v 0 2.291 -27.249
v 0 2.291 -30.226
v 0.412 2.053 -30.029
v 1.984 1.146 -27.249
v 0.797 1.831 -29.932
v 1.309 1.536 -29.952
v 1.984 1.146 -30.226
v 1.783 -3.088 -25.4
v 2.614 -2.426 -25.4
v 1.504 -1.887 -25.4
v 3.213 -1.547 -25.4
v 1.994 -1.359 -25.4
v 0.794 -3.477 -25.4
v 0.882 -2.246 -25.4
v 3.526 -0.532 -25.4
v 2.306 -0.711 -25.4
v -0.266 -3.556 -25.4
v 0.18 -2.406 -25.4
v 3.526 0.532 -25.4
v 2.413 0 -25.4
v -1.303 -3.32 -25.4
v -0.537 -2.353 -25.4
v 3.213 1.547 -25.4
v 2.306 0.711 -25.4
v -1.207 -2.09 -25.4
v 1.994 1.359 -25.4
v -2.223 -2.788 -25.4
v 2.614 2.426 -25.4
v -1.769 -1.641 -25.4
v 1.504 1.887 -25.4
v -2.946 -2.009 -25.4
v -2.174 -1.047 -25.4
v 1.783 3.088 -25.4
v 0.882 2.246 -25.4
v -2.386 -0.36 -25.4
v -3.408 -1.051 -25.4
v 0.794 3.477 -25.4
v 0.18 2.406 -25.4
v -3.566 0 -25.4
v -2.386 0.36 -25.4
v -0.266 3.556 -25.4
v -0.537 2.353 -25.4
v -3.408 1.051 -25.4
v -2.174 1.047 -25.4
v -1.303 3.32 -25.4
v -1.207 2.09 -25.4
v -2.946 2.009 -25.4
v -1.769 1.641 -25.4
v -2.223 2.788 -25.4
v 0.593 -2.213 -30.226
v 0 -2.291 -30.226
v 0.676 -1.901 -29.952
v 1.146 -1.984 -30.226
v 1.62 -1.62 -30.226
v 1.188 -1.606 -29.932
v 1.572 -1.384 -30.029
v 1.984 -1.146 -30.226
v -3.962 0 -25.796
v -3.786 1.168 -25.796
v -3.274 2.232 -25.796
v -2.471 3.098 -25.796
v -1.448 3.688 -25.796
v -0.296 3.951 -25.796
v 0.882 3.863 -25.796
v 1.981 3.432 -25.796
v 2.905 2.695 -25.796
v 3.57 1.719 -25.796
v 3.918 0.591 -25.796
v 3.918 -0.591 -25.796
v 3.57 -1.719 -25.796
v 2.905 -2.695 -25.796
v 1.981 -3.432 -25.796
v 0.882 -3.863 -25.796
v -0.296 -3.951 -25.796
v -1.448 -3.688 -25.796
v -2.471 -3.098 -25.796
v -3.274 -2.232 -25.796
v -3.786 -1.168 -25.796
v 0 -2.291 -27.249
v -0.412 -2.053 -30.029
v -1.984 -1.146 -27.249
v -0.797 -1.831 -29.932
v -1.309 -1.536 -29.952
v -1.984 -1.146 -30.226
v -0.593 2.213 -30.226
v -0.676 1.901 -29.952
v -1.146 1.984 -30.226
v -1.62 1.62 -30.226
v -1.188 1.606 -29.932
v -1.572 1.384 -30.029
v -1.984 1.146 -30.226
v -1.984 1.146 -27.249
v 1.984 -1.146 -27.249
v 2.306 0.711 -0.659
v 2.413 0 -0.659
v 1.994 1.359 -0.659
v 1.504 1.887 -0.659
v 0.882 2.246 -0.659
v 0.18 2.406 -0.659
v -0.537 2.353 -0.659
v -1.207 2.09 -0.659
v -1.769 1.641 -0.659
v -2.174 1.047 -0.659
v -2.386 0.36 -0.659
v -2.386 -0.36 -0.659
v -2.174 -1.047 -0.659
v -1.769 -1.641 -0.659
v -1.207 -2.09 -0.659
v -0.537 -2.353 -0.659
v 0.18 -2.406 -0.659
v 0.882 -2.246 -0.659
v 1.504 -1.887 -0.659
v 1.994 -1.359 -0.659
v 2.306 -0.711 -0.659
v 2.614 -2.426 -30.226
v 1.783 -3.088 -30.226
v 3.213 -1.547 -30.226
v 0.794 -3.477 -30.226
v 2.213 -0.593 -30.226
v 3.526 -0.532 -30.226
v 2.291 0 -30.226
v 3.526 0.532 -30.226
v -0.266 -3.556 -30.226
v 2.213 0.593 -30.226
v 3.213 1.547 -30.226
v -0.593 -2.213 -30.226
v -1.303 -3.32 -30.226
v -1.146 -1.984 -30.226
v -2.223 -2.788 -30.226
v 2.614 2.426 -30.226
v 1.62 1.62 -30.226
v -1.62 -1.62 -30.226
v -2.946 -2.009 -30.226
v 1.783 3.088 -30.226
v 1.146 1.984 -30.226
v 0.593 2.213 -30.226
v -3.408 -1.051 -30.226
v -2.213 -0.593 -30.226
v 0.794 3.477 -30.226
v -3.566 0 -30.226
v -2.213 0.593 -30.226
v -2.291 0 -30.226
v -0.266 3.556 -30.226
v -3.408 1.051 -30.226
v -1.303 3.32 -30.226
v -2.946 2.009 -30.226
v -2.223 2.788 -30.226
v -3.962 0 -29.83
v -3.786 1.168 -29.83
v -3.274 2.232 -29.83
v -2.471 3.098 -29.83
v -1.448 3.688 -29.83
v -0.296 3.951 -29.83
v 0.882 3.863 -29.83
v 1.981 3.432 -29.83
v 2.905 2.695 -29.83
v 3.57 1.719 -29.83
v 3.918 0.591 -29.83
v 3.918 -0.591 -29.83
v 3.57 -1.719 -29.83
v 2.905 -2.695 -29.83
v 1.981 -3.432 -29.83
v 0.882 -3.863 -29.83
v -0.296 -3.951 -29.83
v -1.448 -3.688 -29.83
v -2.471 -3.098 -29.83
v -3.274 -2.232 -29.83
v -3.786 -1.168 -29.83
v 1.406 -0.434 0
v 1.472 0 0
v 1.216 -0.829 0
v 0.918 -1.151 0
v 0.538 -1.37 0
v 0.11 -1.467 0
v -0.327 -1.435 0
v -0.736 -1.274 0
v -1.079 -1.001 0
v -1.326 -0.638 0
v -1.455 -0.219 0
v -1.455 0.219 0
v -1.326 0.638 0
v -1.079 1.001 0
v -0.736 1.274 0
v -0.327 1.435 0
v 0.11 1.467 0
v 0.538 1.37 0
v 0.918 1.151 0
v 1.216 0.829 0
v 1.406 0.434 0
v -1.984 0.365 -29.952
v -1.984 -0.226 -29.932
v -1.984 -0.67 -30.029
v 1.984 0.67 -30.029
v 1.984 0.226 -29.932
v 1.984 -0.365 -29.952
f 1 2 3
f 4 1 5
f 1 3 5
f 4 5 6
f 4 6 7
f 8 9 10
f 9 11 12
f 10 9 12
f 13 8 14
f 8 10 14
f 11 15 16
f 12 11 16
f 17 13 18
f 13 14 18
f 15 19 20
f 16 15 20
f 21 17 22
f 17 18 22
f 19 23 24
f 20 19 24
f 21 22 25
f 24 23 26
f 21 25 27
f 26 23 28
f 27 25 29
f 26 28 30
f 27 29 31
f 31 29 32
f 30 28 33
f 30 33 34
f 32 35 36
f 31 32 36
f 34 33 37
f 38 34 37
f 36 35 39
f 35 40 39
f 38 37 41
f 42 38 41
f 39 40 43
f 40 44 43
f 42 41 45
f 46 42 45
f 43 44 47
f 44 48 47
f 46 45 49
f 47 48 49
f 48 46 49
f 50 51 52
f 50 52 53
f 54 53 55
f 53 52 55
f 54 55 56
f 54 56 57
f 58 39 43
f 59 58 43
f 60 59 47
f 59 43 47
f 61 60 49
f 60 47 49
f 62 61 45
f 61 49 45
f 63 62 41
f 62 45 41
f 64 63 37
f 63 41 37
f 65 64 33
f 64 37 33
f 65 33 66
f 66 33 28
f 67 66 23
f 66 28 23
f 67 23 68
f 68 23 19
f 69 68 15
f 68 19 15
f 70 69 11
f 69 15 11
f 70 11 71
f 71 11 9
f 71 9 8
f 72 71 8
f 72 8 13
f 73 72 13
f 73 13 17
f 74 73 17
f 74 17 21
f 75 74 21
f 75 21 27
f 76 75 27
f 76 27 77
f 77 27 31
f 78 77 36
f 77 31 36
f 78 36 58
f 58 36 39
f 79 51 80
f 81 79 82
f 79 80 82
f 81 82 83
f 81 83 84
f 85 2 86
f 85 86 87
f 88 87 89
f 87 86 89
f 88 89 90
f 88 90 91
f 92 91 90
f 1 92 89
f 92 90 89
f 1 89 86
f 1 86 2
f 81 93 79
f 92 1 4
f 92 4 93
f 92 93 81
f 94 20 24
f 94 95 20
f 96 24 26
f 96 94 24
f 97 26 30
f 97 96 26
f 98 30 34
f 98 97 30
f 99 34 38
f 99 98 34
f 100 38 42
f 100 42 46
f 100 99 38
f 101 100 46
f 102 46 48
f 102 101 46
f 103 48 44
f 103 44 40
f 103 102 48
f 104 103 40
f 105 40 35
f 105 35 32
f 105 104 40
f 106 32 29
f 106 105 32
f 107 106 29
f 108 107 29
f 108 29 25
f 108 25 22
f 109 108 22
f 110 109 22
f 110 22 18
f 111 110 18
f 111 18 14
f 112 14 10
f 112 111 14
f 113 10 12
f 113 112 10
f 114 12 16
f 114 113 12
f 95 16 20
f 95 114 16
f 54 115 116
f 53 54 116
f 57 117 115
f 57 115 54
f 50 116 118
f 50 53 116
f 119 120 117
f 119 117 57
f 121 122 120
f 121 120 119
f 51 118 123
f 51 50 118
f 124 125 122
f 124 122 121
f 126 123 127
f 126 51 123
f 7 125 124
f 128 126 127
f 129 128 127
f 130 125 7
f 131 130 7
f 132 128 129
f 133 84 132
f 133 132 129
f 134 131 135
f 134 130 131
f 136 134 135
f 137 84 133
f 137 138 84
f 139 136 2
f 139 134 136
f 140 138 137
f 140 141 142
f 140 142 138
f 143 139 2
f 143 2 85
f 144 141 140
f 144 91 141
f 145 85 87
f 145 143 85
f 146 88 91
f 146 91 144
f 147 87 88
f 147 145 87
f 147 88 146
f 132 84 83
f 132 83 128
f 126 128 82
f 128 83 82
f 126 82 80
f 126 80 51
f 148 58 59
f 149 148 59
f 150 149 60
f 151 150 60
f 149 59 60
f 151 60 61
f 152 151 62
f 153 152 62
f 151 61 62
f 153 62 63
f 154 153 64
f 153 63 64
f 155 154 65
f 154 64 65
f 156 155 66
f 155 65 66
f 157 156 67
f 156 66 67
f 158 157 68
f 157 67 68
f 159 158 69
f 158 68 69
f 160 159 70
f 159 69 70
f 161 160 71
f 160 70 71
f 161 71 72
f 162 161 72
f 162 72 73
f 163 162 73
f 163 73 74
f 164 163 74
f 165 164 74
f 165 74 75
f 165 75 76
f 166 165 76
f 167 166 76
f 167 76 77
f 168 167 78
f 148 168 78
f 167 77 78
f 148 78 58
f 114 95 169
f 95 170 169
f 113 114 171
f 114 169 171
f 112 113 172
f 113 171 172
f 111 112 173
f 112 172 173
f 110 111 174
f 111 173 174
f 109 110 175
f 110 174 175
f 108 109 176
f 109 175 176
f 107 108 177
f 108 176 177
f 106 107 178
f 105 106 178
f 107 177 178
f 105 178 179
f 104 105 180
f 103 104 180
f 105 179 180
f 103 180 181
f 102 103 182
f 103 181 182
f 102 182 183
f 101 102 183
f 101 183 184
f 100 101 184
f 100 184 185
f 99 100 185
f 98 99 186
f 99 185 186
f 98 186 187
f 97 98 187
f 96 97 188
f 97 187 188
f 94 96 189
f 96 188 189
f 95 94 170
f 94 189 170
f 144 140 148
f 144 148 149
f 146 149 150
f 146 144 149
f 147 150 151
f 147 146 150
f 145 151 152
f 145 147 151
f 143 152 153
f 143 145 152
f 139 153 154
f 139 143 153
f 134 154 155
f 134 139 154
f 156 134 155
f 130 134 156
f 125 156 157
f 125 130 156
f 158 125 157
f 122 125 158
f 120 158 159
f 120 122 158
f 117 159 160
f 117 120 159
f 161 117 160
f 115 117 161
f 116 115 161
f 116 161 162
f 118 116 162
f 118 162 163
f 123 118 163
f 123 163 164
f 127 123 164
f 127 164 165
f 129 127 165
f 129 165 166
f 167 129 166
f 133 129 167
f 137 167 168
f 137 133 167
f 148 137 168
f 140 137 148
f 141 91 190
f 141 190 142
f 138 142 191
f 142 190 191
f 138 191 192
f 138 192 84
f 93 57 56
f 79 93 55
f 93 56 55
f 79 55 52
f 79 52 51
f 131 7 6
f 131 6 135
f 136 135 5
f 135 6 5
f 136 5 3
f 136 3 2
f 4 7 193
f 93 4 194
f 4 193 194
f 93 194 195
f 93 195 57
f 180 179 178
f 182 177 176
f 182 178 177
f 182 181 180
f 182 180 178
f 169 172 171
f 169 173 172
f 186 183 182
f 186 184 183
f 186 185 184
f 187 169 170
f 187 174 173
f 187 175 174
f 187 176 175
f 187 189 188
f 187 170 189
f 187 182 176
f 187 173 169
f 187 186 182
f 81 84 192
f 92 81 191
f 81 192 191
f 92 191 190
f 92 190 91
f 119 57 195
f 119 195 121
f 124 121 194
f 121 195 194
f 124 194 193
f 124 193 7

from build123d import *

# Parameters (mm, degrees)
SKETCH1_R            = 2.413
EXTRUDE1_DEPTH       = 25.4
SKETCH6_R            = 3.9624
EXTRUDE2_DEPTH       = 4.826
CUT_EXTRUDE1_DEPTH   = 2.9765625
CHAMFER1_SIZE        = 0.39624
SKETCH10_R           = 2.413
PARTIAL_THREAD_DEPTH = 3.175
CHAMFER2_SIZE        = 0.09652


with BuildPart() as part:
    # Sketch1 → Extrude1 (new body)
    with BuildSketch(Plane.XY):
        Circle(SKETCH1_R)
    extrude(amount=-EXTRUDE1_DEPTH)

    # Sketch4 → Cut-Revolve1 (revolve, cut)
    with BuildSketch(Plane(origin=(0, 0, 0), x_dir=(0, 0, -1), z_dir=(1, 0, 0)), mode=Mode.PRIVATE) as cut_revolve1_sk:
        Polygon((0.659180743, 2.413), (0, 1.471592336), (0, 2.413), align=None)
    revolve(cut_revolve1_sk.sketch.rotate(Axis((0, 0, 0), (0, 0, -1)), 90), axis=Axis((0, 0, 0), (0, 0, -1)), mode=Mode.SUBTRACT)

    # Sketch6 → Extrude2 (add)
    with BuildSketch(Plane(origin=(0, 0, -25.4), x_dir=(-1, 0, 0), z_dir=(0, 0, -1))):
        Circle(SKETCH6_R)
    extrude(amount=EXTRUDE2_DEPTH)

    # Sketch7 → Cut-Extrude1 (cut)
    with BuildSketch(Plane(origin=(0, 0, -30.226), x_dir=(-1, 0, 0), z_dir=(0, 0, -1))):
        Polygon((0, 2.291358881), (-1.984375, 1.14567944), (-1.984375, -1.14567944), (0, -2.291358881), (1.984375, -1.14567944), (1.984375, 1.14567944), align=None)
    extrude(amount=-CUT_EXTRUDE1_DEPTH, mode=Mode.SUBTRACT)

    # Cut-Extrude2 cone 1 section (through the dimple's axis) → Cut-Extrude2 (revolve, cut)
    with BuildSketch(Plane(origin=(0, 0, -30.226), x_dir=(0, 1, 0), z_dir=(1, 0, 0))):
        Polygon((0, 0), (2.291358881, 0), (0, 2.291358881), align=None)
    revolve(axis=Axis((0, 0, -30.226), (0, 0, 1)), mode=Mode.SUBTRACT)

    # Chamfer1
    chamfer1_edges = [part.edges().sort_by_distance(p)[0] for p in [
        (3.9624, 0, -25.4),
        (3.9624, 0, -30.226),
    ]]
    chamfer(chamfer1_edges, length=CHAMFER1_SIZE)


with BuildPart() as body_2:
    # Sketch10 → partial thread (new body)
    with BuildSketch(Plane.XY.offset(-25.4)):
        Circle(SKETCH10_R)
    extrude(amount=PARTIAL_THREAD_DEPTH)

    # Chamfer2
    chamfer2_edges = [body_2.edges().sort_by_distance(p)[0] for p in [
        (-2.413, 0, -22.225),
    ]]
    chamfer(chamfer2_edges, length=CHAMFER2_SIZE)


with BuildPart() as part_1:
    add(part.part)

    # Combine1: union body 2
    add(body_2.part)


solid = part_1.part
